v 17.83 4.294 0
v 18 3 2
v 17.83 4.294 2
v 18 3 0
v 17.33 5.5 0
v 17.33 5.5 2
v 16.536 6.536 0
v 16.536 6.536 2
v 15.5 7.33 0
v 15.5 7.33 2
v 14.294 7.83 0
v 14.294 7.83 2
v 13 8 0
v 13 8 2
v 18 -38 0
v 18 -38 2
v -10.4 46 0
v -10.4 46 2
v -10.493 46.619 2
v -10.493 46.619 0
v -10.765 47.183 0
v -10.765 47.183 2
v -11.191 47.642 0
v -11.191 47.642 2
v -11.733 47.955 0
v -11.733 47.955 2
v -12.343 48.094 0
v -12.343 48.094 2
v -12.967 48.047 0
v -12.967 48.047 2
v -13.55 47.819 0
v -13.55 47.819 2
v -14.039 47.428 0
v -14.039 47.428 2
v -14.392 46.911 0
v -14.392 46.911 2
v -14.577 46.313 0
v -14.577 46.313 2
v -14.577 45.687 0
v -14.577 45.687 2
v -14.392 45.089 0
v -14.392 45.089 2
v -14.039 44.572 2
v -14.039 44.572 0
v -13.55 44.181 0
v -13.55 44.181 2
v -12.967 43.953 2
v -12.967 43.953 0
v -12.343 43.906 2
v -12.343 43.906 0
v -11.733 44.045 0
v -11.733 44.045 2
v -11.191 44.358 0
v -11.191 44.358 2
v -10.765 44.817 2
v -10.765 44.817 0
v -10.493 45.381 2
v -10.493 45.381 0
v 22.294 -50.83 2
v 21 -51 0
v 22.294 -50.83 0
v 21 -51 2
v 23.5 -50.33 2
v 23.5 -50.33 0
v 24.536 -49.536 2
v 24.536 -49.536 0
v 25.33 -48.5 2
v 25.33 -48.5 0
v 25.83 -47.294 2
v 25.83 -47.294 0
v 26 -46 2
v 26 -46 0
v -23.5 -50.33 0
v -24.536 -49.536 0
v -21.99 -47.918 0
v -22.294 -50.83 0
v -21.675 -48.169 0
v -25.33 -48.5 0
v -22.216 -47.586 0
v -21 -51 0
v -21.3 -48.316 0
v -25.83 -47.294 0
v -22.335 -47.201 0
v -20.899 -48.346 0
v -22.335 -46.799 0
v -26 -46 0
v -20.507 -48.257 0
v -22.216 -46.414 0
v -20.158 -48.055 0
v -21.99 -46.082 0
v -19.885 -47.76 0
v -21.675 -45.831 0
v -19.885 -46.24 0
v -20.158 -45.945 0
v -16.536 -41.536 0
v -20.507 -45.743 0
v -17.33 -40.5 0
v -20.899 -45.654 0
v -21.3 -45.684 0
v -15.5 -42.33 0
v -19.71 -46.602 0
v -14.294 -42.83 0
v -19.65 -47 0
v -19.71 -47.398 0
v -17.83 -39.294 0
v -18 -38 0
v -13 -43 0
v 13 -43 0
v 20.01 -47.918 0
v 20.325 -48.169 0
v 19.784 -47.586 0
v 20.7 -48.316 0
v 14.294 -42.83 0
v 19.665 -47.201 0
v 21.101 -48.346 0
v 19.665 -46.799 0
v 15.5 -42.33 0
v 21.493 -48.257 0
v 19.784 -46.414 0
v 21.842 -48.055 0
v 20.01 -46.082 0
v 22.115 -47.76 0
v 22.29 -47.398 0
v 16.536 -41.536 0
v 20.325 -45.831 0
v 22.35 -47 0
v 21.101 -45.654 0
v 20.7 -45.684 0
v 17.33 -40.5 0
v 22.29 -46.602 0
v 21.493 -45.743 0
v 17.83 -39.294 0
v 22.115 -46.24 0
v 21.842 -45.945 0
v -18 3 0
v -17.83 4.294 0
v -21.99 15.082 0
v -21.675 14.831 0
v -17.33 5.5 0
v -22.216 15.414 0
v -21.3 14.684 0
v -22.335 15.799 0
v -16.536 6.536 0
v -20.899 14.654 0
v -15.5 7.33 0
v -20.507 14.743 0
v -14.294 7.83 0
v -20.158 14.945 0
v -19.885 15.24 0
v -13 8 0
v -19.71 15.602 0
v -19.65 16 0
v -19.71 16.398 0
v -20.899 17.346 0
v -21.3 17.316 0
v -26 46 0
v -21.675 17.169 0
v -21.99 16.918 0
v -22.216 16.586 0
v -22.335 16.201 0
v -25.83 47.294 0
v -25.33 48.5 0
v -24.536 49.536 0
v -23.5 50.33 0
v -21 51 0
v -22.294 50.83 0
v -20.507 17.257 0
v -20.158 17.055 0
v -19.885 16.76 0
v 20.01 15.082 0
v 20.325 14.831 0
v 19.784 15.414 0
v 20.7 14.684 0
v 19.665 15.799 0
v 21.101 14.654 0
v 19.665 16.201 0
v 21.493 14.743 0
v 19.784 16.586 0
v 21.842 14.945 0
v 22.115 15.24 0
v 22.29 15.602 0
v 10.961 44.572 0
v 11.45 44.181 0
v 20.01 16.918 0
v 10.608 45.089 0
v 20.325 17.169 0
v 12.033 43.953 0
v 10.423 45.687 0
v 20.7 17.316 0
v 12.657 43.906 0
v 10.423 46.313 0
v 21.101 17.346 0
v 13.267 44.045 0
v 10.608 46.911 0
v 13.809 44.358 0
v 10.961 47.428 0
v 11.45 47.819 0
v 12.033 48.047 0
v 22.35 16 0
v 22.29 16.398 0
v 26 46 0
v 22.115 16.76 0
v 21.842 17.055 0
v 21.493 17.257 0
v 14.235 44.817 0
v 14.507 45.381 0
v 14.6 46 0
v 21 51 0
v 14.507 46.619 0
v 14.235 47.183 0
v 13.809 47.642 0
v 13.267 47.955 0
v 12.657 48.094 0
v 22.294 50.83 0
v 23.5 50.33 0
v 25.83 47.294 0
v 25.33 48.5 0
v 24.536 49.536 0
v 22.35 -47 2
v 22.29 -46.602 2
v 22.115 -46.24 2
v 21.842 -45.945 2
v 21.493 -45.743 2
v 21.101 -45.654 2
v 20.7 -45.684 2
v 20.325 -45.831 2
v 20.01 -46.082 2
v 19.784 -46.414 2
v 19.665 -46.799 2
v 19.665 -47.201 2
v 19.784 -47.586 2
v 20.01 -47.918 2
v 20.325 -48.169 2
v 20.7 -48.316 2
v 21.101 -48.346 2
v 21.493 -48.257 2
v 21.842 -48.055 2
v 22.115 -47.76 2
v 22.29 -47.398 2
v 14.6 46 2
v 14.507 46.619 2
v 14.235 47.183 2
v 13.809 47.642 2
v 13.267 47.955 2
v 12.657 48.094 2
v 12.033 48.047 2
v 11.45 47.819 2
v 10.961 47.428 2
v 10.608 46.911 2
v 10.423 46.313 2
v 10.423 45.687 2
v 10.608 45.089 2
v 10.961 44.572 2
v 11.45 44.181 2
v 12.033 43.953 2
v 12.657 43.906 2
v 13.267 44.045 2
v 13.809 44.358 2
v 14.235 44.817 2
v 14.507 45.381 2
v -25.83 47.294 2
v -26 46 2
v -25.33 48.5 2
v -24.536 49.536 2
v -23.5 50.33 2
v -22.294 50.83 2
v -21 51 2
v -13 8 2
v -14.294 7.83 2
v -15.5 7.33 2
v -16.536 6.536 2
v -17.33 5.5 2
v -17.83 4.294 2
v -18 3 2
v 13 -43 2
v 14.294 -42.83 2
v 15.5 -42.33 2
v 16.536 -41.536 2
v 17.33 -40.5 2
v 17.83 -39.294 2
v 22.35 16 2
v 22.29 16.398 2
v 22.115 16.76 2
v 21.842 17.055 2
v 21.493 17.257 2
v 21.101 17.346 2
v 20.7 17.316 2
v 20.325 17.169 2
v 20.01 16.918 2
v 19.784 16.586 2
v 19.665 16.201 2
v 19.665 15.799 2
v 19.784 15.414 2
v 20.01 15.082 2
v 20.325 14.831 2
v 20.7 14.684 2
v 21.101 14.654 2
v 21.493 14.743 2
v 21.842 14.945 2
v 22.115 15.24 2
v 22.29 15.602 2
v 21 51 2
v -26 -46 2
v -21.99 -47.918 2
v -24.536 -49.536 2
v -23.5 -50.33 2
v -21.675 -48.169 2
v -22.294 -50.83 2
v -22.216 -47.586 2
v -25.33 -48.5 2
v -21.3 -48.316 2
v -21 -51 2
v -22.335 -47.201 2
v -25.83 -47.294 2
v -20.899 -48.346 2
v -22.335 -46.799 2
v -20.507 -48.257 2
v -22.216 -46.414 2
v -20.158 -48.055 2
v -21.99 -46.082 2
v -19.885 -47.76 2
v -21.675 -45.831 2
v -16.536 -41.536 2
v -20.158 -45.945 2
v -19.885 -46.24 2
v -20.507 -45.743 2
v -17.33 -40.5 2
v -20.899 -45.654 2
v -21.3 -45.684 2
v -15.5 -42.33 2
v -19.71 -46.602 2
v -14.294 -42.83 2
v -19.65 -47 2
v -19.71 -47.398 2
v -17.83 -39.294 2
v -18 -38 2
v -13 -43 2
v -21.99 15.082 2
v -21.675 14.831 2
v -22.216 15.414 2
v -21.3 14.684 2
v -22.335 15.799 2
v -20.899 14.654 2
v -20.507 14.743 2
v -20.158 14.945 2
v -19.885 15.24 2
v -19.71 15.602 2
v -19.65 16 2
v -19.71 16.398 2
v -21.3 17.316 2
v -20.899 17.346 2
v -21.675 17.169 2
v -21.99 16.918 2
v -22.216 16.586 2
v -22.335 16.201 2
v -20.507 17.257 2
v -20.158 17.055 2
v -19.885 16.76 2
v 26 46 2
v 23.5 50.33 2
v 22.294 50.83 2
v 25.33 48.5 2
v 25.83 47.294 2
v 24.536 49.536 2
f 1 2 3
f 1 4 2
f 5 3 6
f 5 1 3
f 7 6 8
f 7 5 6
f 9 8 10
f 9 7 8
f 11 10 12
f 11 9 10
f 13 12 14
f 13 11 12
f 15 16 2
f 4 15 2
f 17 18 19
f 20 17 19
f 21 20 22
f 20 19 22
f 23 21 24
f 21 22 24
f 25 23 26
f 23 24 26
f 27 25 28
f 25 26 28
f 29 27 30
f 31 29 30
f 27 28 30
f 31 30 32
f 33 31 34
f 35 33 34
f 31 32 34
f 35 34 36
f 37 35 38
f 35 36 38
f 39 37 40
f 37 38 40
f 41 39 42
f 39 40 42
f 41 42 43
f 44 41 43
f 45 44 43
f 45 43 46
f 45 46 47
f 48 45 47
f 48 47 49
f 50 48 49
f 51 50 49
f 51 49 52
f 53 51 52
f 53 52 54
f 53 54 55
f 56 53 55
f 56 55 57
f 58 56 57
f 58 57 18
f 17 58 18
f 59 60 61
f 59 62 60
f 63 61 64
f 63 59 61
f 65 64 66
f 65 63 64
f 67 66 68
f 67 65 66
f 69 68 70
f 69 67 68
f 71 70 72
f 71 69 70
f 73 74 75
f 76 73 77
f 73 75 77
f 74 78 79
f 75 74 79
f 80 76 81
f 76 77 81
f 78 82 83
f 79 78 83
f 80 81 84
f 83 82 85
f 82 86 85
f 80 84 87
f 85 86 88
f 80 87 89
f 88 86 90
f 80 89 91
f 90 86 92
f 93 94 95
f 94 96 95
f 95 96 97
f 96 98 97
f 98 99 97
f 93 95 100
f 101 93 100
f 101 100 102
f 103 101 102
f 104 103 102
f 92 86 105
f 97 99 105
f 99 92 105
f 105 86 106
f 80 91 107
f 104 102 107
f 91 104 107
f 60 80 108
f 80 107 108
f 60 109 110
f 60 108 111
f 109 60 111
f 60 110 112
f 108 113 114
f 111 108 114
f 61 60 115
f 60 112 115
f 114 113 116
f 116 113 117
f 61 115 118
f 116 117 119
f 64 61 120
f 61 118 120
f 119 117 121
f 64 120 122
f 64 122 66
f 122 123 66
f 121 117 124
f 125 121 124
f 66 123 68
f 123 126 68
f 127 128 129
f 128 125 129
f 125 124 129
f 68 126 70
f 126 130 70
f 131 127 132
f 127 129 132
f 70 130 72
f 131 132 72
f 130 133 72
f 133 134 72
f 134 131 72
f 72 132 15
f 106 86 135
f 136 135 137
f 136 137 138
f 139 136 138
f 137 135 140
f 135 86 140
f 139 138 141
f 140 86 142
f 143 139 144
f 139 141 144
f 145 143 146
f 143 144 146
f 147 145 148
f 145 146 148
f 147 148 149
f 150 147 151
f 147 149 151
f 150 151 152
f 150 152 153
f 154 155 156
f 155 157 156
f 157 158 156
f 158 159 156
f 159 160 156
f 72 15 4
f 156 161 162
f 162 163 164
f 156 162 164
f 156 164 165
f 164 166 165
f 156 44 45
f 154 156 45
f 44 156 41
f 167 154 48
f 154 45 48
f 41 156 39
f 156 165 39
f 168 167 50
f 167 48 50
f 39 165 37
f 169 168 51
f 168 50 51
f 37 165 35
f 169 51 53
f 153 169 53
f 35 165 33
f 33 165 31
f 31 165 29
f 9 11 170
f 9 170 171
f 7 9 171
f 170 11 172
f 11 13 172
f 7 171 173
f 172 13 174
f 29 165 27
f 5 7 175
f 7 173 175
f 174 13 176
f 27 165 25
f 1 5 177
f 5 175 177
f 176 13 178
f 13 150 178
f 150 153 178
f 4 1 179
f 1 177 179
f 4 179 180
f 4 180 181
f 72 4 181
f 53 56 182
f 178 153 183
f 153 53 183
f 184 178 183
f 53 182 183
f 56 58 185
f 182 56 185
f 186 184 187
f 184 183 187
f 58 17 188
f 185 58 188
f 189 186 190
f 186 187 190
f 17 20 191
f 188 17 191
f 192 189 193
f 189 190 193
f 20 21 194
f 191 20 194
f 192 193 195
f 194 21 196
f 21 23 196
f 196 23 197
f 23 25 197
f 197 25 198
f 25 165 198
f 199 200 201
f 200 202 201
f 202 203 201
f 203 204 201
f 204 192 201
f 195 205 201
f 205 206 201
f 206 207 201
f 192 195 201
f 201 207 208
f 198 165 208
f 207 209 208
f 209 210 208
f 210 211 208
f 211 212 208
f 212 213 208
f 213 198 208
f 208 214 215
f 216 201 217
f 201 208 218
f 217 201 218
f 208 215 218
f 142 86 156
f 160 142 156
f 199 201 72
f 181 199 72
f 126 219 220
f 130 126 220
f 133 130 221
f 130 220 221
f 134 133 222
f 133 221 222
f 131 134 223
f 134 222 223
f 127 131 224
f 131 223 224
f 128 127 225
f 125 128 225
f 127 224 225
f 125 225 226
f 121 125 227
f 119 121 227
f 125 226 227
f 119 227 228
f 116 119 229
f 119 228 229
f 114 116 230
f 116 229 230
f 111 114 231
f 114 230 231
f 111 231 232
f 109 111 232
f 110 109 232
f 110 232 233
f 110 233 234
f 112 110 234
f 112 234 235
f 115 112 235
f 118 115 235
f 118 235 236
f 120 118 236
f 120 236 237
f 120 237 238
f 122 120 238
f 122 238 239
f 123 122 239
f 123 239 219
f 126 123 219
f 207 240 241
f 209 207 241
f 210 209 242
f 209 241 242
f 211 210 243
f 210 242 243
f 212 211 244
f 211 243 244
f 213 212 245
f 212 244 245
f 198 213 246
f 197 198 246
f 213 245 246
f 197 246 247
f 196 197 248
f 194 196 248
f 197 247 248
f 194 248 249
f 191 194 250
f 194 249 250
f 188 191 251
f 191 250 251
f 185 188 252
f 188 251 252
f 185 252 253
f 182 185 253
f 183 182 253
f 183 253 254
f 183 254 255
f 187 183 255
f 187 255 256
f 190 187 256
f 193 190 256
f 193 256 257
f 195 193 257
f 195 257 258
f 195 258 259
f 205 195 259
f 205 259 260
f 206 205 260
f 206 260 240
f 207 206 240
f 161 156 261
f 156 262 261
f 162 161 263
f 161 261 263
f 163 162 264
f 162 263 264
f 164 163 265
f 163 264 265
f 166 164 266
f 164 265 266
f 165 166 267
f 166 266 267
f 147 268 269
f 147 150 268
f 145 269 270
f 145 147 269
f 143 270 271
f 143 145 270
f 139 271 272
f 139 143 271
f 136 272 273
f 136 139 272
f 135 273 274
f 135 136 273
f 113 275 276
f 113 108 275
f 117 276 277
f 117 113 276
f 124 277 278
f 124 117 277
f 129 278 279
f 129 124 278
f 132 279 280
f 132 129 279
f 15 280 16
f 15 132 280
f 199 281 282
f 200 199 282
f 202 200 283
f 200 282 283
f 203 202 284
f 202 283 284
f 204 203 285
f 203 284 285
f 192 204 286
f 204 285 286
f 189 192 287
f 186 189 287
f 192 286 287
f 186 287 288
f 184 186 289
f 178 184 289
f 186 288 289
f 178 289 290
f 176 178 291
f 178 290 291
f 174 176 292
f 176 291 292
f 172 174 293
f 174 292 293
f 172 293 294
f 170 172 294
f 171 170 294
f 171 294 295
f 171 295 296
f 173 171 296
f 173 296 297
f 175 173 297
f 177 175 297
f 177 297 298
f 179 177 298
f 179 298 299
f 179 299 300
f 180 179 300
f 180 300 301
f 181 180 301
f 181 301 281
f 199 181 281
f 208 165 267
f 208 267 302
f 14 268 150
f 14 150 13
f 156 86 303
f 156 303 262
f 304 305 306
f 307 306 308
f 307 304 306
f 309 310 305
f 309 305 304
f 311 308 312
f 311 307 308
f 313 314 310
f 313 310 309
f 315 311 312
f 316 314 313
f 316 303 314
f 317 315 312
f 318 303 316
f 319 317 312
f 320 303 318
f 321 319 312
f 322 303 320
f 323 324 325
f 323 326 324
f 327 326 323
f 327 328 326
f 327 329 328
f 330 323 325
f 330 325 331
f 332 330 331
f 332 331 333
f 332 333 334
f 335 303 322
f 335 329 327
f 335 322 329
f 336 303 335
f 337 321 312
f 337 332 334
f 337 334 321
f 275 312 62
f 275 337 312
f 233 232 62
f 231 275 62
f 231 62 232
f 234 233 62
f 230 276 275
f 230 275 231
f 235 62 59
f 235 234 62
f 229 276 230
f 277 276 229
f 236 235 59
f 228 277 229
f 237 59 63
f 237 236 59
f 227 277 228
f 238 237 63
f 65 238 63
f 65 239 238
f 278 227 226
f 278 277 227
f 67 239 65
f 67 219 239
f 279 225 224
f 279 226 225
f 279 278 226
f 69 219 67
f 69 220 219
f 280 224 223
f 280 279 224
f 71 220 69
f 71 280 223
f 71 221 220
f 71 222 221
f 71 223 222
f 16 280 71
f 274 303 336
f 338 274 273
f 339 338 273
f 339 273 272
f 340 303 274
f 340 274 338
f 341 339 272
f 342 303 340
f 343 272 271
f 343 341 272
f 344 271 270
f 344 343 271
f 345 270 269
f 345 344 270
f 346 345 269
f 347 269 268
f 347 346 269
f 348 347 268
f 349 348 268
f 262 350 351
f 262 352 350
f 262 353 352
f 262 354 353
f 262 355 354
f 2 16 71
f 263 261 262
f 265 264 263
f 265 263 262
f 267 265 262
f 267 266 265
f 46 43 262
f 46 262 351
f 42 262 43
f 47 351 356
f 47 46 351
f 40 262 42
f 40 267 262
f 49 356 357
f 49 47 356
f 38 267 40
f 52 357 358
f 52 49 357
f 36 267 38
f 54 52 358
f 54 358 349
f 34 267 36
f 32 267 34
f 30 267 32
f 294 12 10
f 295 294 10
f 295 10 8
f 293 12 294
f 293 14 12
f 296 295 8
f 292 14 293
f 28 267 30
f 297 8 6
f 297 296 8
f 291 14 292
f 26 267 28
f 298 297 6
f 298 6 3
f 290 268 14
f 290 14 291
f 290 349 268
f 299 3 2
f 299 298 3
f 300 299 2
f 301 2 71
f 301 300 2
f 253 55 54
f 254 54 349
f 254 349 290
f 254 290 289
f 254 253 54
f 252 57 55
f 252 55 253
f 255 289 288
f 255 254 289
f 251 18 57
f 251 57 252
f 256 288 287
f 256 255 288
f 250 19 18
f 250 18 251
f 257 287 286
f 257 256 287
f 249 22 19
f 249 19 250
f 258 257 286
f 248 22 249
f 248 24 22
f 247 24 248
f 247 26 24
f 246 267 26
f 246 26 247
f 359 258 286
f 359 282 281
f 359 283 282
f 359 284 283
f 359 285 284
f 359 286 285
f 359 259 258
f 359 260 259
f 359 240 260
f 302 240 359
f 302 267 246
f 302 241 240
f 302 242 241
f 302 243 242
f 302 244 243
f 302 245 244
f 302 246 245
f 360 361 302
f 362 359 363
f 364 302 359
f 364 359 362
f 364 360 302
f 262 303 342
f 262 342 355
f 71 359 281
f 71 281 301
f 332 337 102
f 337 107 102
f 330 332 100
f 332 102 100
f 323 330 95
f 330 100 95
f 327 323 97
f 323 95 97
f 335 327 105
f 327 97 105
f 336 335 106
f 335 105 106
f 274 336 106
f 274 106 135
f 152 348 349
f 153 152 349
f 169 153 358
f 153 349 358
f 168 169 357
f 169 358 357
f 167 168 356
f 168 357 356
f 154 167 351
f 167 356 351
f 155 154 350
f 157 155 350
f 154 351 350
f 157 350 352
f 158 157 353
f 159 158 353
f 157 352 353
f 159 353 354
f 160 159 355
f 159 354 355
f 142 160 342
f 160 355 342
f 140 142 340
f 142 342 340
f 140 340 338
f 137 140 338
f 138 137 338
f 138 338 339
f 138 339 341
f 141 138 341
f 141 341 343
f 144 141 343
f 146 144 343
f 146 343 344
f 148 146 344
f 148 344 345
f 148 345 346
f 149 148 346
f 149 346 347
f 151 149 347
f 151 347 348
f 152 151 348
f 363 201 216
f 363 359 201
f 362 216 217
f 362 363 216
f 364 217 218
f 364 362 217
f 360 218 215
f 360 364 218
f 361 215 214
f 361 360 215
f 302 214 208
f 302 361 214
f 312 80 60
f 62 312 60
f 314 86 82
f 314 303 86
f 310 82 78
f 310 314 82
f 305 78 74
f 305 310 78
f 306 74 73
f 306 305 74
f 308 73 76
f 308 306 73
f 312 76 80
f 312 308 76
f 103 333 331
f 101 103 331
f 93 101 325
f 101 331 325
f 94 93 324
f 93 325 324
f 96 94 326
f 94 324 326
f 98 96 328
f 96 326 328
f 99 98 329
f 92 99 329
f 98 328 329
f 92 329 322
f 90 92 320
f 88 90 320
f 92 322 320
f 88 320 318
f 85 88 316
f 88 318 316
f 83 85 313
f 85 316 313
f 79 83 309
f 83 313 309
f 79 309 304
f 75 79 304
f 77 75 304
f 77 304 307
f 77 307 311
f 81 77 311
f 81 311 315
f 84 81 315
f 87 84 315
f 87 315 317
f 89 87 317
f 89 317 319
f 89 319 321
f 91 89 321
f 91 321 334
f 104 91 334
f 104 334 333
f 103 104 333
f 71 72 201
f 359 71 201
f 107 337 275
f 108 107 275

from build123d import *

# Parameters (mm, degrees)
SKETCH_1_W          = 52
SKETCH_1_H          = 102
EXTRUDE_1_DEPTH     = 2
FILLET_1_R          = 5
SKETCH_2_R          = 2.1
SKETCH_2_R_2        = 1.35
CUT_EXTRUDE_1_DEPTH = 3
SKETCH_3_W          = 36
SKETCH_3_H          = 51
CUT_EXTRUDE_2_DEPTH = 10
FILLET_2_R          = 5


with BuildPart() as part:
    # 草图1 → 凸台-拉伸1 (new body)
    with BuildSketch(Plane.XY):
        Rectangle(SKETCH_1_W, SKETCH_1_H)
    extrude(amount=EXTRUDE_1_DEPTH)

    # 圆角1
    fillet_1_edges = [part.edges().sort_by_distance(p)[0] for p in [
        (26, -51, 1),
        (-26, -51, 1),
        (-26, 51, 1),
        (26, 51, 1),
    ]]
    fillet(fillet_1_edges, radius=FILLET_1_R)

    # 草图2 → 切除-拉伸1 (cut, through all)
    with BuildSketch(Plane.XY.offset(2)):
        with Locations((-12.5, 46)):
            Circle(SKETCH_2_R)
        with Locations((12.5, 46)):
            Circle(SKETCH_2_R)
        with Locations((-21, 16)):
            Circle(SKETCH_2_R_2)
        with Locations((21, 16)):
            Circle(SKETCH_2_R_2)
        with Locations((-21, -47)):
            Circle(SKETCH_2_R_2)
        with Locations((21, -47)):
            Circle(SKETCH_2_R_2)
    extrude(amount=-CUT_EXTRUDE_1_DEPTH, mode=Mode.SUBTRACT)

    # 草图3 → 切除-拉伸2 (cut)
    with BuildSketch(Plane.XY.offset(2)):
        with Locations((0, -17.5)):
            Rectangle(SKETCH_3_W, SKETCH_3_H)
    extrude(amount=-CUT_EXTRUDE_2_DEPTH, mode=Mode.SUBTRACT)

    # 圆角2
    fillet_2_edges = [part.edges().sort_by_distance(p)[0] for p in [
        (18, 8, 1),
        (18, -43, 1),
        (-18, -43, 1),
        (-18, 8, 1),
    ]]
    fillet(fillet_2_edges, radius=FILLET_2_R)


solid = part.part
